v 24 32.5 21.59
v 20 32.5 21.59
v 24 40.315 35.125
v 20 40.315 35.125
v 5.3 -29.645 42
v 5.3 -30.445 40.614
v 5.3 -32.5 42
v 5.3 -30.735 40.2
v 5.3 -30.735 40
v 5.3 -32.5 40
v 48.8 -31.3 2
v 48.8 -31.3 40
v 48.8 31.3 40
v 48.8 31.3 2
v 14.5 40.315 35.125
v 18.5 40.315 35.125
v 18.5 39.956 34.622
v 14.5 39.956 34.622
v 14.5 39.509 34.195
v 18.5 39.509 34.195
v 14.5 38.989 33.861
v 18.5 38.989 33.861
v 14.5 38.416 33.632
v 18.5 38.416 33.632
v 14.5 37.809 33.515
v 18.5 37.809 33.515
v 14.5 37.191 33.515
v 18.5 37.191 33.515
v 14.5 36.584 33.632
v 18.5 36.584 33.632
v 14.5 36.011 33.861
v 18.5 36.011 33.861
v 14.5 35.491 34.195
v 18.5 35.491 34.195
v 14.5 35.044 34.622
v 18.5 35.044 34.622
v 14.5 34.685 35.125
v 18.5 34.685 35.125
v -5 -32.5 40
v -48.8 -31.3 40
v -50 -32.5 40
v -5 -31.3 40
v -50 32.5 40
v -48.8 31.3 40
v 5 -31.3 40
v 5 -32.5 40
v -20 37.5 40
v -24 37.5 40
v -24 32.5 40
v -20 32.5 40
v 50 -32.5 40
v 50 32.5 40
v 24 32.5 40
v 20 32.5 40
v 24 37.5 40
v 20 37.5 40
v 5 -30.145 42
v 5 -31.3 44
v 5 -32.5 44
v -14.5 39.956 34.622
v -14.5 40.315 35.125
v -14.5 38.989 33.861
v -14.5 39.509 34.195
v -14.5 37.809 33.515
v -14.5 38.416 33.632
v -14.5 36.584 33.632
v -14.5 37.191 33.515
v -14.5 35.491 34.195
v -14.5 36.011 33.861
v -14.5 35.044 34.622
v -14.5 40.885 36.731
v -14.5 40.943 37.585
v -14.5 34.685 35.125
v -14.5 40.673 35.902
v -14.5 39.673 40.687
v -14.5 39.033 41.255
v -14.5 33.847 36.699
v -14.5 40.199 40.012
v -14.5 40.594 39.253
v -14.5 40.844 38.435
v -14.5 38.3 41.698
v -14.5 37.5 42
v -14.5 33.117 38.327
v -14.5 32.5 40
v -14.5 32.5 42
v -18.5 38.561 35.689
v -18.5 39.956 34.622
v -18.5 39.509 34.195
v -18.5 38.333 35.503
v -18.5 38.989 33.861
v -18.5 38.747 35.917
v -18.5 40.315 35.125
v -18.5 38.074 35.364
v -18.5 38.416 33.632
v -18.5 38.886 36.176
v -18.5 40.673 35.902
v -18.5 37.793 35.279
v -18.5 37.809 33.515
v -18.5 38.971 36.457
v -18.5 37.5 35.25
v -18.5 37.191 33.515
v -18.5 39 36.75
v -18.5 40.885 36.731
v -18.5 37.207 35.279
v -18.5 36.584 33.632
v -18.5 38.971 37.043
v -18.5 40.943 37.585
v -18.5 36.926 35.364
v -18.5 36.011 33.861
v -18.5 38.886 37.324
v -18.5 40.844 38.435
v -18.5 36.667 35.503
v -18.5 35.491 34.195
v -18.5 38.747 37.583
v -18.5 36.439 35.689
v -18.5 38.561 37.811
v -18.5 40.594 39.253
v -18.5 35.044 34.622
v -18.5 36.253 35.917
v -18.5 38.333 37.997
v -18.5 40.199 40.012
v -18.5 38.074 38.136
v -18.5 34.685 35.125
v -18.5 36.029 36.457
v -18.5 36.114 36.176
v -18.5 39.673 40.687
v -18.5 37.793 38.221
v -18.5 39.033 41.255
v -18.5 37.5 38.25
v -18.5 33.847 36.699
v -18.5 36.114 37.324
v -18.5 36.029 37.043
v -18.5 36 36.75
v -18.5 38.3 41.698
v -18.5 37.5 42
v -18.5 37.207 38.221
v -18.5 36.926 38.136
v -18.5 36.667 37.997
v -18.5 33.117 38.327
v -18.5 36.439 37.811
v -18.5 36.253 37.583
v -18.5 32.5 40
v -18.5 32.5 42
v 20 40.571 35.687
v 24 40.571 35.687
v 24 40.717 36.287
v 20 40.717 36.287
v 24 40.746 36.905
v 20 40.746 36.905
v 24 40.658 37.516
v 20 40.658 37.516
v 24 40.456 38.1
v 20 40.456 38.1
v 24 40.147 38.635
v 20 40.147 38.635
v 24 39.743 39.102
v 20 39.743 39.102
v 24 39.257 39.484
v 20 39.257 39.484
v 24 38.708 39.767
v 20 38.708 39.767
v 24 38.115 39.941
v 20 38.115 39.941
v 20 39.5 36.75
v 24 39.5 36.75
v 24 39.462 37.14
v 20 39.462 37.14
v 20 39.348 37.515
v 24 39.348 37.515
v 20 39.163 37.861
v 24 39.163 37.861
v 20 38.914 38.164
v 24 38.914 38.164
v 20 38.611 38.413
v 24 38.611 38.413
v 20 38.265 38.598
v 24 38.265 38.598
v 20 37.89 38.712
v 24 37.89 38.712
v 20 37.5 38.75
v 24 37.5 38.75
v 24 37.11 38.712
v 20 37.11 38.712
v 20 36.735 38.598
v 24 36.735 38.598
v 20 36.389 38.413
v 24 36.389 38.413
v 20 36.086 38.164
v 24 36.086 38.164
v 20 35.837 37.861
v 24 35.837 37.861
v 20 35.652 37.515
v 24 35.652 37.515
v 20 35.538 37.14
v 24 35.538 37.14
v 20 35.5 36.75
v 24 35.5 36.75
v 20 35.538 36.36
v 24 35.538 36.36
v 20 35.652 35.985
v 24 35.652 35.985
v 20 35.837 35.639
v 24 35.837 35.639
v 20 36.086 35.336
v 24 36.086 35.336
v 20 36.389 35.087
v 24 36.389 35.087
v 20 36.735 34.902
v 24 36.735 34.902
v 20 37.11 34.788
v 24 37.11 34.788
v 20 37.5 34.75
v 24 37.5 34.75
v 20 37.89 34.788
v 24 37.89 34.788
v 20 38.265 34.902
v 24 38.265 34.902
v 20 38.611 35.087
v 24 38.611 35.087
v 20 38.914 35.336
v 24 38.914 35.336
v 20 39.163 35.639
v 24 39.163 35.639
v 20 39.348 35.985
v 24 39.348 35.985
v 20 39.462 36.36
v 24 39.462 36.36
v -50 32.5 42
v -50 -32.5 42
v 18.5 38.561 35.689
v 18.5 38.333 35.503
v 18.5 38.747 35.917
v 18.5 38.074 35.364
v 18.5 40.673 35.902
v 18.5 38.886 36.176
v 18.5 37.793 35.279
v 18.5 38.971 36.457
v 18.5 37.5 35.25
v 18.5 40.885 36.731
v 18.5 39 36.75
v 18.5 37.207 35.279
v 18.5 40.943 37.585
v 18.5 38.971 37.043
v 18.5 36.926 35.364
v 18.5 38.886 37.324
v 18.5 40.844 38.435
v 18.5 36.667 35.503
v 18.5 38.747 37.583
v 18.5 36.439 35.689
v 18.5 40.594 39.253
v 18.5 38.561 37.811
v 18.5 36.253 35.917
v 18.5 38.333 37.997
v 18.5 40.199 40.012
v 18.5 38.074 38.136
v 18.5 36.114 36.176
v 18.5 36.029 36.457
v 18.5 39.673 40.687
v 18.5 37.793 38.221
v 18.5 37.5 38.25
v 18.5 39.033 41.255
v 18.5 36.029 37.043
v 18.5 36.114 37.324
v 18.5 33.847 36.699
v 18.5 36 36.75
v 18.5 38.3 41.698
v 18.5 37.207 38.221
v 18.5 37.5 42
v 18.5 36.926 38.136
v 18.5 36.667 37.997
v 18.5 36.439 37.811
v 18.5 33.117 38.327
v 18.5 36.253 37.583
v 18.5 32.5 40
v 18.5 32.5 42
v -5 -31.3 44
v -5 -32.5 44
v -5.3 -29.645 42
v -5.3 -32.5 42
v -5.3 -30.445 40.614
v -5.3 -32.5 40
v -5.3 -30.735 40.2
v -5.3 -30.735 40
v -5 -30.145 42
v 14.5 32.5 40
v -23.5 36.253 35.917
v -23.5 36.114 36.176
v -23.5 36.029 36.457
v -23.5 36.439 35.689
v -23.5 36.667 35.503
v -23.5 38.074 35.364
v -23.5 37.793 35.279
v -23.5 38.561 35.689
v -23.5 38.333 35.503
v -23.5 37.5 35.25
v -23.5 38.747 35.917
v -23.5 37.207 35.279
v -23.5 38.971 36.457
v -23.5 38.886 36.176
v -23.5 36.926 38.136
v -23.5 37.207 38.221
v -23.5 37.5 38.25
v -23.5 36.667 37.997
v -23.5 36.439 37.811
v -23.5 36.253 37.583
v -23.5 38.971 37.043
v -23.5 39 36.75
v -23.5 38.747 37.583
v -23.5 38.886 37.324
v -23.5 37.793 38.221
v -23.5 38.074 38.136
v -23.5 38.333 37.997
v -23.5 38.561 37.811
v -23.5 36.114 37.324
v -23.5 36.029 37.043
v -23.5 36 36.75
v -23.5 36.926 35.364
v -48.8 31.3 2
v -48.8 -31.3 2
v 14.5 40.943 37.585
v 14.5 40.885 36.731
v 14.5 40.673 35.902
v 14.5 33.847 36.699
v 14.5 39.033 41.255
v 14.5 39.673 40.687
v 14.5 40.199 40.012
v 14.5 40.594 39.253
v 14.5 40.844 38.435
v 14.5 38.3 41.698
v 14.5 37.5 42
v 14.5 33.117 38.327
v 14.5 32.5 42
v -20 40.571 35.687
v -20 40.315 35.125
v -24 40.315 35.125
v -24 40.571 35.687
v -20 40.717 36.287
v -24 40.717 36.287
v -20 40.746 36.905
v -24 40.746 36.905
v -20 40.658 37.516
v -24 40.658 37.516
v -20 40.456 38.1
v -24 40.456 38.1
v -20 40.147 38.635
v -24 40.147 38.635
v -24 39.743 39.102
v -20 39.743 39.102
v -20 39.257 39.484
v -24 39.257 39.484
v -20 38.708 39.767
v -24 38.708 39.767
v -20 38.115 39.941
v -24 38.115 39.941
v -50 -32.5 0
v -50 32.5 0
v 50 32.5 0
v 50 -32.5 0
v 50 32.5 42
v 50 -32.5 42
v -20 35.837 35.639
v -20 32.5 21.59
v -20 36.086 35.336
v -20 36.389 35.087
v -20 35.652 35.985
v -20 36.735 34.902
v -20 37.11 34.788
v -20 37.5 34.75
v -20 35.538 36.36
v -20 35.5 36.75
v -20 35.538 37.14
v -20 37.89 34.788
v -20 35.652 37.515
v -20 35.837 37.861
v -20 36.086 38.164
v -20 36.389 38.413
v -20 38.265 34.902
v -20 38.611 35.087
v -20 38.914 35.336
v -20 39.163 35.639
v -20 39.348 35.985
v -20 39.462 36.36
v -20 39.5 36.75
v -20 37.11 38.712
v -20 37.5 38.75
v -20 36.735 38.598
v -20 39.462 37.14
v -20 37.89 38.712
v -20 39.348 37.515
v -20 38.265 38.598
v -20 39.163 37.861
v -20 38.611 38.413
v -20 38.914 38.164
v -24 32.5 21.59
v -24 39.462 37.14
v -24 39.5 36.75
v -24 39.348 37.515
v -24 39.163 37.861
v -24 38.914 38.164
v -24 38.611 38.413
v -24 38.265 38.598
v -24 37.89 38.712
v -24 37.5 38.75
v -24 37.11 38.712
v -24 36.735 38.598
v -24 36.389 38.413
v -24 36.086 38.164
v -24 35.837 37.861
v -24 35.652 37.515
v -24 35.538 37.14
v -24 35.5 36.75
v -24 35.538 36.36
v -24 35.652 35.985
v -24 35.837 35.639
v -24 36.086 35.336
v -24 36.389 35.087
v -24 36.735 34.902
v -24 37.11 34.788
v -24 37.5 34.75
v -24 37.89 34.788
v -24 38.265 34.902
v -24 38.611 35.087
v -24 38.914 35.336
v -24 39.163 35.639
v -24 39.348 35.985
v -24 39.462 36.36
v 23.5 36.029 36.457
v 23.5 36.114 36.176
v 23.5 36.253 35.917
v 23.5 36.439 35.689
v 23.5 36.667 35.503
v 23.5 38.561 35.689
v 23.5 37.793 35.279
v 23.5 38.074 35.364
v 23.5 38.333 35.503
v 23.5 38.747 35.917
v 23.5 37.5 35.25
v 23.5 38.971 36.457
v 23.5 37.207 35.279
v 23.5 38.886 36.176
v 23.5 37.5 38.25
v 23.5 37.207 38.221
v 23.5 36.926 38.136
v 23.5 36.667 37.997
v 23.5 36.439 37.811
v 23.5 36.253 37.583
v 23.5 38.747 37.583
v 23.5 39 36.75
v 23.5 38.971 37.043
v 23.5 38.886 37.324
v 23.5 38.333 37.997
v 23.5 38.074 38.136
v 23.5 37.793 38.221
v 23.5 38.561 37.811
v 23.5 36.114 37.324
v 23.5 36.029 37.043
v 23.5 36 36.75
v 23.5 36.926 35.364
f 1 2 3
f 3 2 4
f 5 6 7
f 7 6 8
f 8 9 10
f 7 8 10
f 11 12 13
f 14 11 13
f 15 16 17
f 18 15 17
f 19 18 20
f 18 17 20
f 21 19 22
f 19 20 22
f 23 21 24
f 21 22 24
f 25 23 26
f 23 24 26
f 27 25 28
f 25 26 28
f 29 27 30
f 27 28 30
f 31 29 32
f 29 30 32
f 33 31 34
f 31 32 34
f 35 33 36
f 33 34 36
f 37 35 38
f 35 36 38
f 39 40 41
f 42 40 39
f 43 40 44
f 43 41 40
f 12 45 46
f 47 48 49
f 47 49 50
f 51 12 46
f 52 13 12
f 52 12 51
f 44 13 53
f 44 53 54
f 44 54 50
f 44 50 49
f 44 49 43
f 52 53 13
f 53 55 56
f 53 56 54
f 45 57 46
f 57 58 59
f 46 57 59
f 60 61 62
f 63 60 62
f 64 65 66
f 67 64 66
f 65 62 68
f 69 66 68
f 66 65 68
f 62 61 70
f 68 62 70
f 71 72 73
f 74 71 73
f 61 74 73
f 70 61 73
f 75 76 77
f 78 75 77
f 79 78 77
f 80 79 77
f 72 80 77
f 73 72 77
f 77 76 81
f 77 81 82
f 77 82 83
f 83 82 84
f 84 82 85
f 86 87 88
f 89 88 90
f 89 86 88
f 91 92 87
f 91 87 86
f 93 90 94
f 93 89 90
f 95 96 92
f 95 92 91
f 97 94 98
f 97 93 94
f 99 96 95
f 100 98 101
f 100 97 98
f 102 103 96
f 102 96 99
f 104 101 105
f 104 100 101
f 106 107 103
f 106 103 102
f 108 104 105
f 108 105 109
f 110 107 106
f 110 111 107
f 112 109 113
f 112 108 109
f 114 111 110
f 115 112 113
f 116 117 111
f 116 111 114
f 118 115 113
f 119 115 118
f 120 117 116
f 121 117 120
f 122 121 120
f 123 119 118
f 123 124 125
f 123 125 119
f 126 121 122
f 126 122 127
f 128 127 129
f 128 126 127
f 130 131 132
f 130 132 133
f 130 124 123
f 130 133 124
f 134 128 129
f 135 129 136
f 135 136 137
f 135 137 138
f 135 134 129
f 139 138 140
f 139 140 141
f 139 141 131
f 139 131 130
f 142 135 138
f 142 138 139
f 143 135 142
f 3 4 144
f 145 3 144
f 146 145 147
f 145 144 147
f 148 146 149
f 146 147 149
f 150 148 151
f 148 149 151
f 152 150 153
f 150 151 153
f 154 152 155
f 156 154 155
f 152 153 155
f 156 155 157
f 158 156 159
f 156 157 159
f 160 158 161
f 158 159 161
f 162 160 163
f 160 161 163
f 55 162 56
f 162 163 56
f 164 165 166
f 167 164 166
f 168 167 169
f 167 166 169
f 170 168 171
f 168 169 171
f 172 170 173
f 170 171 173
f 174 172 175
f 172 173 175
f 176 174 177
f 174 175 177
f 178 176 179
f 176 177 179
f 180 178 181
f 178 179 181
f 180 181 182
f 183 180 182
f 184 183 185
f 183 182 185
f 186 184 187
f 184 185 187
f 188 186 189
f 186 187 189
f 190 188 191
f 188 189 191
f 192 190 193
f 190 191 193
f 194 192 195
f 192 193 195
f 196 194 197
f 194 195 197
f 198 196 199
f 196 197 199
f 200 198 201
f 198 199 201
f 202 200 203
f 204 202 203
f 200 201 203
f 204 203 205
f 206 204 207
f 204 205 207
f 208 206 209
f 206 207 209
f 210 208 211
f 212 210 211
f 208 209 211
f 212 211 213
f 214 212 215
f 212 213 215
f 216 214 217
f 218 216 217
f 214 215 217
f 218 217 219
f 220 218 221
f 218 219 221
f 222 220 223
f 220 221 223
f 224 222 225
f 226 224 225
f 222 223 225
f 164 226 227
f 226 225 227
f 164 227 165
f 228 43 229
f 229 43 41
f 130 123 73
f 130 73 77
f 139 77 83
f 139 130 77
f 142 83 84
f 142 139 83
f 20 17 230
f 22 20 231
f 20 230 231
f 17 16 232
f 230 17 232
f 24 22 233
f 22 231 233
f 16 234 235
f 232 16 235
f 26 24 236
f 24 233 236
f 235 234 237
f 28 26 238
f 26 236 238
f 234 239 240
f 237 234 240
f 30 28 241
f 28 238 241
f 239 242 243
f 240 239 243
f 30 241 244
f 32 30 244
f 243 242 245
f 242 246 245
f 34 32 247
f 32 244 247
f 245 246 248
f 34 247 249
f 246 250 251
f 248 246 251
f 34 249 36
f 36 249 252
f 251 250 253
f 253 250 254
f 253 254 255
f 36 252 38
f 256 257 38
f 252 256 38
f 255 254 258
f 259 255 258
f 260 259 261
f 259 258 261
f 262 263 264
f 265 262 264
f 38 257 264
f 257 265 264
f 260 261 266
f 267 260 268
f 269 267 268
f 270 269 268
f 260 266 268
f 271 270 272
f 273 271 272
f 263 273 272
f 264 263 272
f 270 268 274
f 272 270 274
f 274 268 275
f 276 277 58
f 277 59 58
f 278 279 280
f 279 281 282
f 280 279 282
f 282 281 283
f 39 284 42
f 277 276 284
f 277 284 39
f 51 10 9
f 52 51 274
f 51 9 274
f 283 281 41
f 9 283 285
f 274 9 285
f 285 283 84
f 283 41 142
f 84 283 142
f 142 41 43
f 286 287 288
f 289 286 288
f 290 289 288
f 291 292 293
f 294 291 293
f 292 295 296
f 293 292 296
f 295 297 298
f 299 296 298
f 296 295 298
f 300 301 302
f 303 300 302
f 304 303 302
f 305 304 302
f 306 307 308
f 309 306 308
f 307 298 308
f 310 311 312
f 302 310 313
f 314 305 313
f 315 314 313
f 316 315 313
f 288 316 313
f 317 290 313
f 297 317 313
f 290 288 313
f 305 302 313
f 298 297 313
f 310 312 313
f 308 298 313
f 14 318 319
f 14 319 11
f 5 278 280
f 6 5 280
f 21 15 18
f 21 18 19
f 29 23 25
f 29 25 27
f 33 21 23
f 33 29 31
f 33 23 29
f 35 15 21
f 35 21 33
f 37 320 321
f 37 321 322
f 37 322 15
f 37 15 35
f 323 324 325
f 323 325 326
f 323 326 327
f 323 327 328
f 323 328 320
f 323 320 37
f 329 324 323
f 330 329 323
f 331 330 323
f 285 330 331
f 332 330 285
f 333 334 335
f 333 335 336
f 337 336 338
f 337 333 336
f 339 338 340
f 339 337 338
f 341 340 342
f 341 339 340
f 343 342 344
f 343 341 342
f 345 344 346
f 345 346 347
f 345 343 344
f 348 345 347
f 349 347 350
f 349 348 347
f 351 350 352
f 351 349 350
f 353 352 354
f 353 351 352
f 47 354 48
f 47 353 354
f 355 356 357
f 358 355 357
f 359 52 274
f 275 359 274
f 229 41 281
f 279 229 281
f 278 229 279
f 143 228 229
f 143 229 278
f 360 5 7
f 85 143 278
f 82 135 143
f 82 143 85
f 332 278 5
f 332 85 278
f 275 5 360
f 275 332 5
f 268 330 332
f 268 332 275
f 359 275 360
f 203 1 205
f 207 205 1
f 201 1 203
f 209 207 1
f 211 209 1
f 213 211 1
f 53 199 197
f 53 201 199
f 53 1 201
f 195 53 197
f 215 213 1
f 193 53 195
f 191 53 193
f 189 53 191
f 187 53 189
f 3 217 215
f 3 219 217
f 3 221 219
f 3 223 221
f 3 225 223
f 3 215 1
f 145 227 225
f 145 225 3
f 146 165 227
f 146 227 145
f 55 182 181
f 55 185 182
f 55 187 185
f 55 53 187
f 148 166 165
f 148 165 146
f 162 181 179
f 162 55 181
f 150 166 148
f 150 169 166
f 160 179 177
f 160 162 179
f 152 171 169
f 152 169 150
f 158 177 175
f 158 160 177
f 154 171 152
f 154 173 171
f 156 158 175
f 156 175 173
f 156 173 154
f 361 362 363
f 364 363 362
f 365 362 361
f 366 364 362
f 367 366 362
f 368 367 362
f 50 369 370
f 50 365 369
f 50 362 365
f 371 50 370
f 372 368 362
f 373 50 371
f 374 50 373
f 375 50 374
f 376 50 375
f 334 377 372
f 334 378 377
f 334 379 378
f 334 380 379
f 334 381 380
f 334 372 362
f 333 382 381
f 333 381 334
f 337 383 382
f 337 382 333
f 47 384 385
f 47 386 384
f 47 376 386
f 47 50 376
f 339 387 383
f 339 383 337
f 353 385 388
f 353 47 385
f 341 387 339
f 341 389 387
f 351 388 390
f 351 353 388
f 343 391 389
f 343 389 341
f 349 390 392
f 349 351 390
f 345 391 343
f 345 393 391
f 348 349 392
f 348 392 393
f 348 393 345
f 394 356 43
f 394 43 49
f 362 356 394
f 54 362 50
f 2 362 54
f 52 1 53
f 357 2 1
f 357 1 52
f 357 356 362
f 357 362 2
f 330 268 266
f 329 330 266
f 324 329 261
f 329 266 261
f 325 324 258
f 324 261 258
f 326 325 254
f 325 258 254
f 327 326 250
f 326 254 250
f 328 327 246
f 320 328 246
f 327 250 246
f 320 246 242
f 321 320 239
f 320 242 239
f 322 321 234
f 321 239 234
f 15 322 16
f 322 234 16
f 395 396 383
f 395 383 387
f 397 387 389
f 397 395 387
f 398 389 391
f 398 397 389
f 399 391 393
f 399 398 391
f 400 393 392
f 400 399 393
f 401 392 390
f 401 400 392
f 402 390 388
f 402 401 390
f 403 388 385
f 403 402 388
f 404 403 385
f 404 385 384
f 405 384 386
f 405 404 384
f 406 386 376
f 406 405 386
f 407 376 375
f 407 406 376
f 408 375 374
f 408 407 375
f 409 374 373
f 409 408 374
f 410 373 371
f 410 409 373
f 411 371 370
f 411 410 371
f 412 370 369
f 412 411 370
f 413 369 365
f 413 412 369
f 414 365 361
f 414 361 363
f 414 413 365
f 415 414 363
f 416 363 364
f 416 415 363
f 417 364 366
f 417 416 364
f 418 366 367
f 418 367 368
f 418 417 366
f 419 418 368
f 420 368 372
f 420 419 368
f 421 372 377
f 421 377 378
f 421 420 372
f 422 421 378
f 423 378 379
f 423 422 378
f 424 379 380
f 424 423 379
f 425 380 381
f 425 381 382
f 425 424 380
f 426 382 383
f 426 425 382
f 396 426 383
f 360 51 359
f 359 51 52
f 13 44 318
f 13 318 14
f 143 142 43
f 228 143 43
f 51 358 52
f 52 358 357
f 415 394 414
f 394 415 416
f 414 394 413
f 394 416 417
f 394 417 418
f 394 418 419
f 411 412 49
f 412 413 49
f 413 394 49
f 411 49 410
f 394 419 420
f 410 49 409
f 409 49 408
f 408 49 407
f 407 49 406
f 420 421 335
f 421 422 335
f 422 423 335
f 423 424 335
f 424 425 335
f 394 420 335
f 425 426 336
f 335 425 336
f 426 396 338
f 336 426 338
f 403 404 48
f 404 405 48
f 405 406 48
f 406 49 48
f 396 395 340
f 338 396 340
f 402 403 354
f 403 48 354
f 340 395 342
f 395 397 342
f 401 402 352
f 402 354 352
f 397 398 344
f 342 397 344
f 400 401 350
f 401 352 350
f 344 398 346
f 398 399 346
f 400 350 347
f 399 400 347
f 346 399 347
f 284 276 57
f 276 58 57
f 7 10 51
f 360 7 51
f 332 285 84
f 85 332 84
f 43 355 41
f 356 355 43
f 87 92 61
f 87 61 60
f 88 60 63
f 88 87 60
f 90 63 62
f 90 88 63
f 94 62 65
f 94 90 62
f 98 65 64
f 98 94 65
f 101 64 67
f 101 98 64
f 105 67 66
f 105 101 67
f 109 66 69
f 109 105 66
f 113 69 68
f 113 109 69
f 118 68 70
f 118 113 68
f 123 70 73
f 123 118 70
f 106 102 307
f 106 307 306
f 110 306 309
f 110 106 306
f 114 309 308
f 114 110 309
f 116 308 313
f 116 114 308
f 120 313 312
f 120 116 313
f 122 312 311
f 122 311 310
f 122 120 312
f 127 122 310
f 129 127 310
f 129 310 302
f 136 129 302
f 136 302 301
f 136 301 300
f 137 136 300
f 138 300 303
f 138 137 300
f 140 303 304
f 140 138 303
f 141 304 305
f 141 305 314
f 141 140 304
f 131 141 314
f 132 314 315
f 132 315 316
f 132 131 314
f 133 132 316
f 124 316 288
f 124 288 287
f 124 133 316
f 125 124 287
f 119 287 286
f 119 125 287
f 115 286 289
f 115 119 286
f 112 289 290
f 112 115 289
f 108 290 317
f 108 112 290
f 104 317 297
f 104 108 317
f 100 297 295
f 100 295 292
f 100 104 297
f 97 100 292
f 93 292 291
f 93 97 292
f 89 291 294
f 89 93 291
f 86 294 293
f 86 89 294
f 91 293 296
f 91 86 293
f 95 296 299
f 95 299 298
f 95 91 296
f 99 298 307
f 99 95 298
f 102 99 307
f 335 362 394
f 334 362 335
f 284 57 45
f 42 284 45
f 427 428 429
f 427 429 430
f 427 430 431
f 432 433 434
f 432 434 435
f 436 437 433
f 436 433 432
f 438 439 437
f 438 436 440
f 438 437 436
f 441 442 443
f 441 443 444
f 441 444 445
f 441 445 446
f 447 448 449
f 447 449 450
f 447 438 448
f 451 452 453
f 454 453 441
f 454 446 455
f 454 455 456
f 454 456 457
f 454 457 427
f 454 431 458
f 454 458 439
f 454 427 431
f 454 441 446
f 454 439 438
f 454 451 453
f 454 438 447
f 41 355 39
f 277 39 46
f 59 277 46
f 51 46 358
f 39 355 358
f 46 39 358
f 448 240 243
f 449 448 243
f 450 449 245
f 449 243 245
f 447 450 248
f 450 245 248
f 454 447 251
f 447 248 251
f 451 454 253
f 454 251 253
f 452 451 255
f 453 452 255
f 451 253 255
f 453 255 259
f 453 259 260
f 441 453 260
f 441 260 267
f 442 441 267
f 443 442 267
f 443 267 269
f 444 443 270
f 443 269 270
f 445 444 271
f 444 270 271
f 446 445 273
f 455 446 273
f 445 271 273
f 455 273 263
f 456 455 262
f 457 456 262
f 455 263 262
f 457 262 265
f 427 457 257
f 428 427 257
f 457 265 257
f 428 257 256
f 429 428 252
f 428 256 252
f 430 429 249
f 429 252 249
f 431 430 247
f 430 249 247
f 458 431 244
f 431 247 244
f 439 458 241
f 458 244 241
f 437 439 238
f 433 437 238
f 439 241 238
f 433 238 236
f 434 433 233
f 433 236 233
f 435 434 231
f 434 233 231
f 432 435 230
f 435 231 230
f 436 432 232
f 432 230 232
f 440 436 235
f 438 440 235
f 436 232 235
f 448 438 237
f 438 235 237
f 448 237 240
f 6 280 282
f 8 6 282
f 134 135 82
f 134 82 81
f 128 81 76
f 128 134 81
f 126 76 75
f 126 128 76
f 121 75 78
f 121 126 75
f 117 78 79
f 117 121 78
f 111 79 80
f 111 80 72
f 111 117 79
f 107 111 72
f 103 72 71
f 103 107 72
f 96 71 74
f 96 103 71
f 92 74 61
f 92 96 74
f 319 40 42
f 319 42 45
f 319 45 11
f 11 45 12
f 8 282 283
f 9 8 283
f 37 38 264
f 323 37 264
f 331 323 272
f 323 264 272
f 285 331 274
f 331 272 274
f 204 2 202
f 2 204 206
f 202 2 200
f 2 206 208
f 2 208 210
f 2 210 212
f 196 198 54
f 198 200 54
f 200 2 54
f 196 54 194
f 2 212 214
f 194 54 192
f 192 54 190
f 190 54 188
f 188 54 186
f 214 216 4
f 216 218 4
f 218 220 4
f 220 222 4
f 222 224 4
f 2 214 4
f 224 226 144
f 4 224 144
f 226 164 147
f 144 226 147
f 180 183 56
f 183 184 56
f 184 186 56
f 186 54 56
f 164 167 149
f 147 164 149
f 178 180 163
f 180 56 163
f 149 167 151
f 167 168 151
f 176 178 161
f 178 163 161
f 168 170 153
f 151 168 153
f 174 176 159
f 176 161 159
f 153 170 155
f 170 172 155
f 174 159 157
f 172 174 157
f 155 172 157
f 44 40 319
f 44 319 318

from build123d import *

# Parameters (mm, degrees)
SKETCH_W        = 100
SKETCH_H        = 65
PAD_DEPTH       = 40
SKETCH001_W     = 97.6
SKETCH001_H     = 62.6
POCKET_DEPTH    = 38
PAD001_DEPTH    = 4
SKETCH003_R     = 2
POCKET001_DEPTH = 4
PAD002_DEPTH    = 5
PAD003_DEPTH    = 2
PAD004_DEPTH    = 4
SKETCH007_R     = 1.5
PAD005_DEPTH    = 5
POCKET002_DEPTH = 10.6
PAD006_DEPTH    = 10.6


with BuildPart() as screwbox_100x65:
    # Sketch → Pad (new body)
    with BuildSketch(Plane.XY):
        Rectangle(SKETCH_W, SKETCH_H)
    extrude(amount=PAD_DEPTH)

    # Sketch001 (on Face6 of Pad) → Pocket (cut)
    with BuildSketch(Plane.XY.offset(40)):
        Rectangle(SKETCH001_W, SKETCH001_H)
    extrude(amount=-POCKET_DEPTH, mode=Mode.SUBTRACT)

    # Sketch002 (on DatumPlane) → Pad001 (join)
    with BuildSketch(Plane.YZ.offset(20)):
        with BuildLine():
            Line((32.5, 40), (32.5, 21.589746))
            Line((32.5, 21.589746), (40.314583, 35.125))
            ThreePointArc((40.314583, 35.125), (40.314583, 38.375), (37.5, 40))
            Line((32.5, 40), (37.5, 40))
        make_face()
    pad001 = extrude(amount=PAD001_DEPTH)

    # Mirrored: Pad001 across YZ
    add(pad001.mirror(Plane.YZ))

    # Sketch003 (on Face18 of Mirrored) → Pocket001 (cut)
    with BuildSketch(Plane.YZ.offset(24)):
        with Locations((37.5, 36.75)):
            Circle(SKETCH003_R)
    pocket001 = extrude(amount=-POCKET001_DEPTH, mode=Mode.SUBTRACT)

    # Mirrored001: Pocket001 across YZ
    add(pocket001.mirror(Plane.YZ), mode=Mode.SUBTRACT)

    # Sketch004 → Pad002 (join, symmetric)
    with BuildSketch(Plane.YZ):
        Polygon((-32.5, 40), (-32.5, 44), (-31.3, 44), (-30.145299, 42), (-31.3, 40), align=None)
    extrude(amount=PAD002_DEPTH, both=True)


with BuildPart() as lid_100x65:
    # Sketch005 (on Face1 of CopyPad002) → Pad003 (new body)
    with BuildSketch(Plane.XY.offset(40)):
        Polygon((-5.3, -30.445), (5.3, -30.445), (5.3, -32.5), (50, -32.5), (50, 32.5), (-50, 32.5), (-50, -32.5), (-5.3, -32.5), align=None)
    extrude(amount=PAD003_DEPTH)

    # Sketch006 (on DatumPlane) → Pad004 (join)
    with BuildSketch(Plane(origin=(18.5, 0, 0), x_dir=(0, -1, 0), z_dir=(-1, 0, 0))):
        with BuildLine():
            Line((-32.5, 40), (-32.5, 42))
            Line((-32.5, 42), (-37.5, 42))
            ThreePointArc((-37.5, 42), (-40.593683, 39.252898), (-40.314583, 35.125))
            ThreePointArc((-40.314583, 35.125), (-37.5, 33.5), (-34.685417, 35.125))
            ThreePointArc((-34.685417, 35.125), (-33.468084, 37.506632), (-32.5, 40))
        make_face()
    pad004 = extrude(amount=PAD004_DEPTH)

    # Mirrored002: Pad004 across YZ
    add(pad004.mirror(Plane.YZ))

    # Sketch007 (on Face22 of Mirrored002) → Pad005 (join)
    with BuildSketch(Plane.YZ.offset(18.5)):
        with Locations((37.5, 36.75)):
            Circle(SKETCH007_R)
    pad005 = extrude(amount=PAD005_DEPTH)

    # Mirrored003: Pad005 across YZ
    add(pad005.mirror(Plane.YZ))

    # Sketch008 (on Face2 of Mirrored003) → Pocket002 (cut)
    with BuildSketch(Plane.YZ.offset(-5.3)):
        Polygon((-30.445, 42), (-29.645, 42), (-30.445, 40.614359), align=None)
    extrude(amount=POCKET002_DEPTH, mode=Mode.SUBTRACT)

    # Sketch009 (on Face5 of Pocket002) → Pad006 (join)
    with BuildSketch(Plane.YZ.offset(-5.3)):
        Polygon((-30.445, 40.614359), (-30.735138, 40.2), (-30.735138, 40), (-30.445, 40), align=None)
    extrude(amount=PAD006_DEPTH)


solid = Compound([screwbox_100x65.part, lid_100x65.part])
